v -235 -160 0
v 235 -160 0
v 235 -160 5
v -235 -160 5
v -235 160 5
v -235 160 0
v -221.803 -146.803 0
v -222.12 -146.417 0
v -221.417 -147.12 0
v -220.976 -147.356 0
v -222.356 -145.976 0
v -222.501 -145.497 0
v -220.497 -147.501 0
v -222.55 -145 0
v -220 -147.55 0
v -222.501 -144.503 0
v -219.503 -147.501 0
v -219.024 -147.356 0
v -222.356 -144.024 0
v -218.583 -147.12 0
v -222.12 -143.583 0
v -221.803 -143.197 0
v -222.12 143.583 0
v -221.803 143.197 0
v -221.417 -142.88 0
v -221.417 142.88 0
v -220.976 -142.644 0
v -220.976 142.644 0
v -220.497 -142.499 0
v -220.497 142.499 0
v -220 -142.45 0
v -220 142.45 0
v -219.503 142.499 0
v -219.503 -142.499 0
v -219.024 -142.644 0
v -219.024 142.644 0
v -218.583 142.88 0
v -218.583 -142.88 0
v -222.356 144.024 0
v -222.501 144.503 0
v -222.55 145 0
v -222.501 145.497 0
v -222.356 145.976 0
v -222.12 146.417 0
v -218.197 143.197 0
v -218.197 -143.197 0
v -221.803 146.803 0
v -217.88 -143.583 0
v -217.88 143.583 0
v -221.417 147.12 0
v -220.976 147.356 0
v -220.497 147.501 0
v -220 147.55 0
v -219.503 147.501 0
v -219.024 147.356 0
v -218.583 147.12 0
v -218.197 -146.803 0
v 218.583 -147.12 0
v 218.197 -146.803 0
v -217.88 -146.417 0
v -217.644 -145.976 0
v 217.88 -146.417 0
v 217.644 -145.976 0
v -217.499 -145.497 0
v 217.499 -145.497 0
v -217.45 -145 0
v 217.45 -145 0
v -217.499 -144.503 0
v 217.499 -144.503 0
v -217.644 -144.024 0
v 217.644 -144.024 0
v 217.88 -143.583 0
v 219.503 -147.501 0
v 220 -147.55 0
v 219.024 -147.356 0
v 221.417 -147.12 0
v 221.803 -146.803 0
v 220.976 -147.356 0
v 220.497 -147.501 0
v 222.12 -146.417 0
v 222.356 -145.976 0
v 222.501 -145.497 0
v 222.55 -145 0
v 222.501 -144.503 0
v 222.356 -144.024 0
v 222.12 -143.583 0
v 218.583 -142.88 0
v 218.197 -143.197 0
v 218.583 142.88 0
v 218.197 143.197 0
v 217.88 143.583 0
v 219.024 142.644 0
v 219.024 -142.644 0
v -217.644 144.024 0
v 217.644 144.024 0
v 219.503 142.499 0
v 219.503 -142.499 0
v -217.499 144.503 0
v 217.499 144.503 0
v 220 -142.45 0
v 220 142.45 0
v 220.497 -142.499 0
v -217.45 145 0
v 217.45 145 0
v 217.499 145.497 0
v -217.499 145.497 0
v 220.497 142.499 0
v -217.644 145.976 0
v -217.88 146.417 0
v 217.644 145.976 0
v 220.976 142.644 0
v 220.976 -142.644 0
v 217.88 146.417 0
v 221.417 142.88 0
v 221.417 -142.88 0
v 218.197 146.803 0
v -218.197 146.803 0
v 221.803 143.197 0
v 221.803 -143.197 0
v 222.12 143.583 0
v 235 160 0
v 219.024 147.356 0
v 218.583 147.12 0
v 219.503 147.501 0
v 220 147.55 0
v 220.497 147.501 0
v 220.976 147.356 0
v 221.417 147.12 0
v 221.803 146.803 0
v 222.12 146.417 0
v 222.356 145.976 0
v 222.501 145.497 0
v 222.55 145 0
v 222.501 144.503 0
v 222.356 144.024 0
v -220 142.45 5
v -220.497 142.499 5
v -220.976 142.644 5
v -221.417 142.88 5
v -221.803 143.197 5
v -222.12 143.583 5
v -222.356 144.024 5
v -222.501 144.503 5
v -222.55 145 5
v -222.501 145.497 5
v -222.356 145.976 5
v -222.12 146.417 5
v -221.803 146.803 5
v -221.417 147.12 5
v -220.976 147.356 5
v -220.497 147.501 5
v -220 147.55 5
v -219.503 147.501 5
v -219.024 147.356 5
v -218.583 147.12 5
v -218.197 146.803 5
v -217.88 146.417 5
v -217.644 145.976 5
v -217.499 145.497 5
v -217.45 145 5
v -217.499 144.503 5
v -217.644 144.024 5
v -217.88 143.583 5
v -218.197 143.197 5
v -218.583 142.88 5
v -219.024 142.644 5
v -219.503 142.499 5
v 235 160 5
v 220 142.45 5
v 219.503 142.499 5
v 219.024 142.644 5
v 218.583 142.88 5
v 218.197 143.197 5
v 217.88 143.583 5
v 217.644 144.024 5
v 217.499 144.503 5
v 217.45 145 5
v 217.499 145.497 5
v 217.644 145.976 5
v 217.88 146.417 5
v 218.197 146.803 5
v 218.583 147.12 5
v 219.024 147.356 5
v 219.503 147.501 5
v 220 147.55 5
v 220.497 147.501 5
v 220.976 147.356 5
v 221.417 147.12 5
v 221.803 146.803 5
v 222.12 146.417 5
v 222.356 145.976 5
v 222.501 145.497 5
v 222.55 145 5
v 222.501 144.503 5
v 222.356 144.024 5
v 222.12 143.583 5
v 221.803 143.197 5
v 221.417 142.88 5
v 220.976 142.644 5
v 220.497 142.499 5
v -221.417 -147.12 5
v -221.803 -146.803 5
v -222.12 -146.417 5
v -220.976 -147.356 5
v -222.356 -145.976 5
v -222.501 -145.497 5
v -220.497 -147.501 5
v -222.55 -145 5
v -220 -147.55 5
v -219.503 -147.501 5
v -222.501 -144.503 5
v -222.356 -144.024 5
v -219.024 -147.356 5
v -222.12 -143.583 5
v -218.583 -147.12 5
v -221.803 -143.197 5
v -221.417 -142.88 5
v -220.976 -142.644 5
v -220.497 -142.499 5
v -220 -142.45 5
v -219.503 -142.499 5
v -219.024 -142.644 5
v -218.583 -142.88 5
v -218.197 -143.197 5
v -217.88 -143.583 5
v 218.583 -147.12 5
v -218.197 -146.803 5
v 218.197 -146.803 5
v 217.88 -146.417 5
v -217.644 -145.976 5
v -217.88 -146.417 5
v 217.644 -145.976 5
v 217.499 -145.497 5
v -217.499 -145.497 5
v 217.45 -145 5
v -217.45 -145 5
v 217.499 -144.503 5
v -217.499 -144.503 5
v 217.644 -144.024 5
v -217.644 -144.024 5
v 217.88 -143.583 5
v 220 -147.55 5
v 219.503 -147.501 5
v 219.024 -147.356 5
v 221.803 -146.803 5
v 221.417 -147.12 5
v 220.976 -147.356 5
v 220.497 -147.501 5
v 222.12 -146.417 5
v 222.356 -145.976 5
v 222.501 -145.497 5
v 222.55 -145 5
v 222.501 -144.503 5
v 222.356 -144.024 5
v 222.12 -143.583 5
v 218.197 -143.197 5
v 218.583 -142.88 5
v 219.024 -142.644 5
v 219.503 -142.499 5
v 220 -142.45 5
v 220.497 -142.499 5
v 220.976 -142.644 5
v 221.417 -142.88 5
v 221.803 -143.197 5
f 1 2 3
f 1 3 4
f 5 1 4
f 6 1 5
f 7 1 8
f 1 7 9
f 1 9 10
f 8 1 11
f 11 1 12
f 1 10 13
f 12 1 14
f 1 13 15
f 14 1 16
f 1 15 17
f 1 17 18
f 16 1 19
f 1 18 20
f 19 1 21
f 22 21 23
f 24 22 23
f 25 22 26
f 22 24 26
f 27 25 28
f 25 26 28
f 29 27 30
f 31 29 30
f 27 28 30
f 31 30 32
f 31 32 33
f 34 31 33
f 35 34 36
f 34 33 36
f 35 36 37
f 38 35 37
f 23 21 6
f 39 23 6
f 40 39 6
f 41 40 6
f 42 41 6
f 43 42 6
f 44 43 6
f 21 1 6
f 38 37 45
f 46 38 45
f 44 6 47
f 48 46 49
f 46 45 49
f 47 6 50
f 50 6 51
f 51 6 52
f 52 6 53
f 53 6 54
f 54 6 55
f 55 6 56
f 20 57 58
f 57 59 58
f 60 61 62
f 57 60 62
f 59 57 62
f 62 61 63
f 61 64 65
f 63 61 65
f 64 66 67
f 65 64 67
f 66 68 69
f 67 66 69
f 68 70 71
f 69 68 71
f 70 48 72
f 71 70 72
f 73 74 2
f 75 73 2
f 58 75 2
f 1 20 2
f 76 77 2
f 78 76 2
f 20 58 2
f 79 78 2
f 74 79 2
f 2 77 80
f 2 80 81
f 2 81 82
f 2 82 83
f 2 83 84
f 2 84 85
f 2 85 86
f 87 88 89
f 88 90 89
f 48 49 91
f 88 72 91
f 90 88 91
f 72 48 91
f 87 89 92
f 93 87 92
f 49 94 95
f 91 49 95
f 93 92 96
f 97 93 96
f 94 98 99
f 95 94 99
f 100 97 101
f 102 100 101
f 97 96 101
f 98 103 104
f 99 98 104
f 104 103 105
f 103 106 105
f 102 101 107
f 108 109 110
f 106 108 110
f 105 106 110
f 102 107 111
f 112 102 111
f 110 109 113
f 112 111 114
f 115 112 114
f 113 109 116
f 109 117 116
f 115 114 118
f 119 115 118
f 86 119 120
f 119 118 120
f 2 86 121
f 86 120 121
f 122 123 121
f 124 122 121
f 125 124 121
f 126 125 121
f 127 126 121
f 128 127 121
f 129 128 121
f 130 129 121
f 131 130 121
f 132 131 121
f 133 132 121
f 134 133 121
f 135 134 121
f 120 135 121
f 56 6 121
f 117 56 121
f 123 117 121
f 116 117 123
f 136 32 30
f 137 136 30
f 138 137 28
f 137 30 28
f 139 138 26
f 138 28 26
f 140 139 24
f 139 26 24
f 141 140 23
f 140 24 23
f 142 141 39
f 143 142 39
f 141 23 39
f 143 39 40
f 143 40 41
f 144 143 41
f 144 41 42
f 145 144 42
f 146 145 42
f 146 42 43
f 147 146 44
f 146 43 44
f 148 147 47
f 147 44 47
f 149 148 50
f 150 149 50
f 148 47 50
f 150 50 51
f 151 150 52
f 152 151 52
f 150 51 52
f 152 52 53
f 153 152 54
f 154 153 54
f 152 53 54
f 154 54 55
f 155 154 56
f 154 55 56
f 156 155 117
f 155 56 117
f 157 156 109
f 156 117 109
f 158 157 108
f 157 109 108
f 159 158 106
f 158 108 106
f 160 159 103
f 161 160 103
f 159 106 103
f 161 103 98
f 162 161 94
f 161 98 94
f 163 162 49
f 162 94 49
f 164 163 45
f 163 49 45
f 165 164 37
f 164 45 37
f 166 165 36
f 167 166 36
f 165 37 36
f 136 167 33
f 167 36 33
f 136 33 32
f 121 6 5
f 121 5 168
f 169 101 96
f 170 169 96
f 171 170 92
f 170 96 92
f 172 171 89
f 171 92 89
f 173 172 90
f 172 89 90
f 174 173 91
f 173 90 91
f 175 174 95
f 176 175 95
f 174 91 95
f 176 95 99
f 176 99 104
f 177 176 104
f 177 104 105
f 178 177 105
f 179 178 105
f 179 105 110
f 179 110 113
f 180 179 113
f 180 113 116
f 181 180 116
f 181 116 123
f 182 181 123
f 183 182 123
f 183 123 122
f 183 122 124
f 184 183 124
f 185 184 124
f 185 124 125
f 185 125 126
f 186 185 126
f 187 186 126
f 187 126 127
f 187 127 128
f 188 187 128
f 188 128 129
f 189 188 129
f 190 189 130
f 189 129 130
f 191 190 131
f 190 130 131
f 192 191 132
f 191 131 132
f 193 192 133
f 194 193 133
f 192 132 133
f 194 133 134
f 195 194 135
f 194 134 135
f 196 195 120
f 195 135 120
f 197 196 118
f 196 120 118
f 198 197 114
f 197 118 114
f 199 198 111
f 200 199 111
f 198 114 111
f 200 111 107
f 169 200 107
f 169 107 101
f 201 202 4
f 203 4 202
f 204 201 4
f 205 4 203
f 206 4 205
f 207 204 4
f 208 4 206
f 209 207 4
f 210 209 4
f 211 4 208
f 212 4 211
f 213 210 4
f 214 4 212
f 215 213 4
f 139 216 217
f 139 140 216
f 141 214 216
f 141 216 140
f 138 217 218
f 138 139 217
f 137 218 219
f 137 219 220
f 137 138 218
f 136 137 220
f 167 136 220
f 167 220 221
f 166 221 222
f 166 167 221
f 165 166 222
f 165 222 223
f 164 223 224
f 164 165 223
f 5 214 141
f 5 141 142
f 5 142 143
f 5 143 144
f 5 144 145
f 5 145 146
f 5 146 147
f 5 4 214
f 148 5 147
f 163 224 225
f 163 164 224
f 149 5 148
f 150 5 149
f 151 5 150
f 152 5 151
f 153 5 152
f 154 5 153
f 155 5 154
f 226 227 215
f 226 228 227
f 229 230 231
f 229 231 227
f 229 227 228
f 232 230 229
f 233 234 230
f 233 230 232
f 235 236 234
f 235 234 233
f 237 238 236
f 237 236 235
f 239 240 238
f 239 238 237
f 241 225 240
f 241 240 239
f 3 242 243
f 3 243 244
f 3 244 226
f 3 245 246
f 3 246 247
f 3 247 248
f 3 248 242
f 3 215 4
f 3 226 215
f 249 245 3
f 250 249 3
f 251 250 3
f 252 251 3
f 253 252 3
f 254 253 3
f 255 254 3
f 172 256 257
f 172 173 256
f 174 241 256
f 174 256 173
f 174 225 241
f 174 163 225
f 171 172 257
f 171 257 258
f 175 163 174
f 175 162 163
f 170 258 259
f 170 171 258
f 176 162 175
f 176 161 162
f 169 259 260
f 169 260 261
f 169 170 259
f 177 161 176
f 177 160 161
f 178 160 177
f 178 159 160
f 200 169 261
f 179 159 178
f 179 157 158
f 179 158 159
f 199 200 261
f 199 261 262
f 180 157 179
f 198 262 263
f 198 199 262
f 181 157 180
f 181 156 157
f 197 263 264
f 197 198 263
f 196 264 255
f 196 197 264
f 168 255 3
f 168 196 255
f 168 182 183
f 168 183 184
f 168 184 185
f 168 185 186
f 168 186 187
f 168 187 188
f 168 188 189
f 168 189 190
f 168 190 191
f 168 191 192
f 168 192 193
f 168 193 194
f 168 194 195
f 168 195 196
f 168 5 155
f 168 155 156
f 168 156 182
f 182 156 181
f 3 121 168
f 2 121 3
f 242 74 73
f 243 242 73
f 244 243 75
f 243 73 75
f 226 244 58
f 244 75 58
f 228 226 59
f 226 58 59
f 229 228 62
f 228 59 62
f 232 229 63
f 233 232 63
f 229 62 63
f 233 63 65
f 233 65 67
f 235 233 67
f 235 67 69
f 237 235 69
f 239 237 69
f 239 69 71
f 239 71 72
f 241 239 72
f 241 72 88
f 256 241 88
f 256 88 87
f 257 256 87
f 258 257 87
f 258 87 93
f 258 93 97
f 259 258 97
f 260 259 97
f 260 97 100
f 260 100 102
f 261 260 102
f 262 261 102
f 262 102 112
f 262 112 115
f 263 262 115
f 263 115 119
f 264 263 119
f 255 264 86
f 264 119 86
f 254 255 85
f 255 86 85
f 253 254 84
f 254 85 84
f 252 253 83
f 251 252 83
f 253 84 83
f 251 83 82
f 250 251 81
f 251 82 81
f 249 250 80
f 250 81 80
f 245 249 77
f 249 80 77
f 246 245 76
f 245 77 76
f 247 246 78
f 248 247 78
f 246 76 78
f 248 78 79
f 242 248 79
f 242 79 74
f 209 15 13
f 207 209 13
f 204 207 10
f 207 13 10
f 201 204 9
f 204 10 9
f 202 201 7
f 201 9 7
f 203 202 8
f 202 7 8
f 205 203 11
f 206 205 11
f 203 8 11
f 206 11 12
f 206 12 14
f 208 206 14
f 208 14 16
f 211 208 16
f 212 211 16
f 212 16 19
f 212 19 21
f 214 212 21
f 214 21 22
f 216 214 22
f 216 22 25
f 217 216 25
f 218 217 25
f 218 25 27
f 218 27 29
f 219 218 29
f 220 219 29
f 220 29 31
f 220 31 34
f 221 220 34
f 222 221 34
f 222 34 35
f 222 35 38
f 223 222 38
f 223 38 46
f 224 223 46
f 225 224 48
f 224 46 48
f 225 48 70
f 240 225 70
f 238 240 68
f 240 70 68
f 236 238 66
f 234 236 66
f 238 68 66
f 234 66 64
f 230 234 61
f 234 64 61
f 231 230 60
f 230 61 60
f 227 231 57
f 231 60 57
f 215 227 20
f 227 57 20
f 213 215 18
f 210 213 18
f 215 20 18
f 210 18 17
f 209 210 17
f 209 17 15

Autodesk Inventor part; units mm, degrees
ref_plane "YZ Plane" through (0, 0, 0) normal (1, 0, 0) x (0, 1, 0)
ref_plane "XZ Plane" through (0, 0, 0) normal (0, 1, 0) x (-1, 0, 0)
ref_plane "XY Plane" through (0, 0, 0) normal (0, 0, 1) x (1, 0, 0)
sketch "Sketch1" plane through (0, 0, 0) normal (0, 0, 1) x (1, 0, 0)
  line L0 (-235, 160) -> (235, 160)
  line L1 (235, 160) -> (235, -160)
  line L2 (235, -160) -> (-235, -160)
  line L3 (-235, -160) -> (-235, 160)
  point P0 (0, 0)
  dimension "d0" = 470
  dimension "d1" = 320
  dimension "d6" = 235
  dimension "d7" = 160
extrude "Extrusion1" add sketch "Sketch1" along normal blind 5
sketch "Sketch2" plane through (0, 0, 5) normal (0, 0, 1) x (1, 0, 0)
  line L0 (235, -160) -> (235, 160) projected
  line L1 (-235, -160) -> (235, -160) projected
  line L2 (-235, 160) -> (-235, -160) construction
  line L3 (-235, 0) -> (235, 0) construction
  line L4 (0, -160) -> (0, 160) construction
  line L5 (235, 160) -> (-235, 160) construction
  point P0 (0, 0)
  point P1 (-220, 145)
  point P2 (-220, -145)
  point P3 (220, -145)
  point P4 (220, 145)
  dimension "d4" = 15
  dimension "d5" = 15
hole "Hole1" at (-220, 145, 5) at (-220, -145, 5) at (220, -145, 5) at (220, 145, 5) direction (0, 0, -1) diameter 5.1 end through all
sketch "Sketch3" plane through (0, 0, 5) normal (0, 0, 1) x (1, 0, 0)
  point P0 (0, 0)
equation "\"d6\" = 0.5 * d0"
equation "\"d7\" = 0.5 * d1"
properties part number "PortaPiezas" material "MDF Medium Density Fiberboard"
